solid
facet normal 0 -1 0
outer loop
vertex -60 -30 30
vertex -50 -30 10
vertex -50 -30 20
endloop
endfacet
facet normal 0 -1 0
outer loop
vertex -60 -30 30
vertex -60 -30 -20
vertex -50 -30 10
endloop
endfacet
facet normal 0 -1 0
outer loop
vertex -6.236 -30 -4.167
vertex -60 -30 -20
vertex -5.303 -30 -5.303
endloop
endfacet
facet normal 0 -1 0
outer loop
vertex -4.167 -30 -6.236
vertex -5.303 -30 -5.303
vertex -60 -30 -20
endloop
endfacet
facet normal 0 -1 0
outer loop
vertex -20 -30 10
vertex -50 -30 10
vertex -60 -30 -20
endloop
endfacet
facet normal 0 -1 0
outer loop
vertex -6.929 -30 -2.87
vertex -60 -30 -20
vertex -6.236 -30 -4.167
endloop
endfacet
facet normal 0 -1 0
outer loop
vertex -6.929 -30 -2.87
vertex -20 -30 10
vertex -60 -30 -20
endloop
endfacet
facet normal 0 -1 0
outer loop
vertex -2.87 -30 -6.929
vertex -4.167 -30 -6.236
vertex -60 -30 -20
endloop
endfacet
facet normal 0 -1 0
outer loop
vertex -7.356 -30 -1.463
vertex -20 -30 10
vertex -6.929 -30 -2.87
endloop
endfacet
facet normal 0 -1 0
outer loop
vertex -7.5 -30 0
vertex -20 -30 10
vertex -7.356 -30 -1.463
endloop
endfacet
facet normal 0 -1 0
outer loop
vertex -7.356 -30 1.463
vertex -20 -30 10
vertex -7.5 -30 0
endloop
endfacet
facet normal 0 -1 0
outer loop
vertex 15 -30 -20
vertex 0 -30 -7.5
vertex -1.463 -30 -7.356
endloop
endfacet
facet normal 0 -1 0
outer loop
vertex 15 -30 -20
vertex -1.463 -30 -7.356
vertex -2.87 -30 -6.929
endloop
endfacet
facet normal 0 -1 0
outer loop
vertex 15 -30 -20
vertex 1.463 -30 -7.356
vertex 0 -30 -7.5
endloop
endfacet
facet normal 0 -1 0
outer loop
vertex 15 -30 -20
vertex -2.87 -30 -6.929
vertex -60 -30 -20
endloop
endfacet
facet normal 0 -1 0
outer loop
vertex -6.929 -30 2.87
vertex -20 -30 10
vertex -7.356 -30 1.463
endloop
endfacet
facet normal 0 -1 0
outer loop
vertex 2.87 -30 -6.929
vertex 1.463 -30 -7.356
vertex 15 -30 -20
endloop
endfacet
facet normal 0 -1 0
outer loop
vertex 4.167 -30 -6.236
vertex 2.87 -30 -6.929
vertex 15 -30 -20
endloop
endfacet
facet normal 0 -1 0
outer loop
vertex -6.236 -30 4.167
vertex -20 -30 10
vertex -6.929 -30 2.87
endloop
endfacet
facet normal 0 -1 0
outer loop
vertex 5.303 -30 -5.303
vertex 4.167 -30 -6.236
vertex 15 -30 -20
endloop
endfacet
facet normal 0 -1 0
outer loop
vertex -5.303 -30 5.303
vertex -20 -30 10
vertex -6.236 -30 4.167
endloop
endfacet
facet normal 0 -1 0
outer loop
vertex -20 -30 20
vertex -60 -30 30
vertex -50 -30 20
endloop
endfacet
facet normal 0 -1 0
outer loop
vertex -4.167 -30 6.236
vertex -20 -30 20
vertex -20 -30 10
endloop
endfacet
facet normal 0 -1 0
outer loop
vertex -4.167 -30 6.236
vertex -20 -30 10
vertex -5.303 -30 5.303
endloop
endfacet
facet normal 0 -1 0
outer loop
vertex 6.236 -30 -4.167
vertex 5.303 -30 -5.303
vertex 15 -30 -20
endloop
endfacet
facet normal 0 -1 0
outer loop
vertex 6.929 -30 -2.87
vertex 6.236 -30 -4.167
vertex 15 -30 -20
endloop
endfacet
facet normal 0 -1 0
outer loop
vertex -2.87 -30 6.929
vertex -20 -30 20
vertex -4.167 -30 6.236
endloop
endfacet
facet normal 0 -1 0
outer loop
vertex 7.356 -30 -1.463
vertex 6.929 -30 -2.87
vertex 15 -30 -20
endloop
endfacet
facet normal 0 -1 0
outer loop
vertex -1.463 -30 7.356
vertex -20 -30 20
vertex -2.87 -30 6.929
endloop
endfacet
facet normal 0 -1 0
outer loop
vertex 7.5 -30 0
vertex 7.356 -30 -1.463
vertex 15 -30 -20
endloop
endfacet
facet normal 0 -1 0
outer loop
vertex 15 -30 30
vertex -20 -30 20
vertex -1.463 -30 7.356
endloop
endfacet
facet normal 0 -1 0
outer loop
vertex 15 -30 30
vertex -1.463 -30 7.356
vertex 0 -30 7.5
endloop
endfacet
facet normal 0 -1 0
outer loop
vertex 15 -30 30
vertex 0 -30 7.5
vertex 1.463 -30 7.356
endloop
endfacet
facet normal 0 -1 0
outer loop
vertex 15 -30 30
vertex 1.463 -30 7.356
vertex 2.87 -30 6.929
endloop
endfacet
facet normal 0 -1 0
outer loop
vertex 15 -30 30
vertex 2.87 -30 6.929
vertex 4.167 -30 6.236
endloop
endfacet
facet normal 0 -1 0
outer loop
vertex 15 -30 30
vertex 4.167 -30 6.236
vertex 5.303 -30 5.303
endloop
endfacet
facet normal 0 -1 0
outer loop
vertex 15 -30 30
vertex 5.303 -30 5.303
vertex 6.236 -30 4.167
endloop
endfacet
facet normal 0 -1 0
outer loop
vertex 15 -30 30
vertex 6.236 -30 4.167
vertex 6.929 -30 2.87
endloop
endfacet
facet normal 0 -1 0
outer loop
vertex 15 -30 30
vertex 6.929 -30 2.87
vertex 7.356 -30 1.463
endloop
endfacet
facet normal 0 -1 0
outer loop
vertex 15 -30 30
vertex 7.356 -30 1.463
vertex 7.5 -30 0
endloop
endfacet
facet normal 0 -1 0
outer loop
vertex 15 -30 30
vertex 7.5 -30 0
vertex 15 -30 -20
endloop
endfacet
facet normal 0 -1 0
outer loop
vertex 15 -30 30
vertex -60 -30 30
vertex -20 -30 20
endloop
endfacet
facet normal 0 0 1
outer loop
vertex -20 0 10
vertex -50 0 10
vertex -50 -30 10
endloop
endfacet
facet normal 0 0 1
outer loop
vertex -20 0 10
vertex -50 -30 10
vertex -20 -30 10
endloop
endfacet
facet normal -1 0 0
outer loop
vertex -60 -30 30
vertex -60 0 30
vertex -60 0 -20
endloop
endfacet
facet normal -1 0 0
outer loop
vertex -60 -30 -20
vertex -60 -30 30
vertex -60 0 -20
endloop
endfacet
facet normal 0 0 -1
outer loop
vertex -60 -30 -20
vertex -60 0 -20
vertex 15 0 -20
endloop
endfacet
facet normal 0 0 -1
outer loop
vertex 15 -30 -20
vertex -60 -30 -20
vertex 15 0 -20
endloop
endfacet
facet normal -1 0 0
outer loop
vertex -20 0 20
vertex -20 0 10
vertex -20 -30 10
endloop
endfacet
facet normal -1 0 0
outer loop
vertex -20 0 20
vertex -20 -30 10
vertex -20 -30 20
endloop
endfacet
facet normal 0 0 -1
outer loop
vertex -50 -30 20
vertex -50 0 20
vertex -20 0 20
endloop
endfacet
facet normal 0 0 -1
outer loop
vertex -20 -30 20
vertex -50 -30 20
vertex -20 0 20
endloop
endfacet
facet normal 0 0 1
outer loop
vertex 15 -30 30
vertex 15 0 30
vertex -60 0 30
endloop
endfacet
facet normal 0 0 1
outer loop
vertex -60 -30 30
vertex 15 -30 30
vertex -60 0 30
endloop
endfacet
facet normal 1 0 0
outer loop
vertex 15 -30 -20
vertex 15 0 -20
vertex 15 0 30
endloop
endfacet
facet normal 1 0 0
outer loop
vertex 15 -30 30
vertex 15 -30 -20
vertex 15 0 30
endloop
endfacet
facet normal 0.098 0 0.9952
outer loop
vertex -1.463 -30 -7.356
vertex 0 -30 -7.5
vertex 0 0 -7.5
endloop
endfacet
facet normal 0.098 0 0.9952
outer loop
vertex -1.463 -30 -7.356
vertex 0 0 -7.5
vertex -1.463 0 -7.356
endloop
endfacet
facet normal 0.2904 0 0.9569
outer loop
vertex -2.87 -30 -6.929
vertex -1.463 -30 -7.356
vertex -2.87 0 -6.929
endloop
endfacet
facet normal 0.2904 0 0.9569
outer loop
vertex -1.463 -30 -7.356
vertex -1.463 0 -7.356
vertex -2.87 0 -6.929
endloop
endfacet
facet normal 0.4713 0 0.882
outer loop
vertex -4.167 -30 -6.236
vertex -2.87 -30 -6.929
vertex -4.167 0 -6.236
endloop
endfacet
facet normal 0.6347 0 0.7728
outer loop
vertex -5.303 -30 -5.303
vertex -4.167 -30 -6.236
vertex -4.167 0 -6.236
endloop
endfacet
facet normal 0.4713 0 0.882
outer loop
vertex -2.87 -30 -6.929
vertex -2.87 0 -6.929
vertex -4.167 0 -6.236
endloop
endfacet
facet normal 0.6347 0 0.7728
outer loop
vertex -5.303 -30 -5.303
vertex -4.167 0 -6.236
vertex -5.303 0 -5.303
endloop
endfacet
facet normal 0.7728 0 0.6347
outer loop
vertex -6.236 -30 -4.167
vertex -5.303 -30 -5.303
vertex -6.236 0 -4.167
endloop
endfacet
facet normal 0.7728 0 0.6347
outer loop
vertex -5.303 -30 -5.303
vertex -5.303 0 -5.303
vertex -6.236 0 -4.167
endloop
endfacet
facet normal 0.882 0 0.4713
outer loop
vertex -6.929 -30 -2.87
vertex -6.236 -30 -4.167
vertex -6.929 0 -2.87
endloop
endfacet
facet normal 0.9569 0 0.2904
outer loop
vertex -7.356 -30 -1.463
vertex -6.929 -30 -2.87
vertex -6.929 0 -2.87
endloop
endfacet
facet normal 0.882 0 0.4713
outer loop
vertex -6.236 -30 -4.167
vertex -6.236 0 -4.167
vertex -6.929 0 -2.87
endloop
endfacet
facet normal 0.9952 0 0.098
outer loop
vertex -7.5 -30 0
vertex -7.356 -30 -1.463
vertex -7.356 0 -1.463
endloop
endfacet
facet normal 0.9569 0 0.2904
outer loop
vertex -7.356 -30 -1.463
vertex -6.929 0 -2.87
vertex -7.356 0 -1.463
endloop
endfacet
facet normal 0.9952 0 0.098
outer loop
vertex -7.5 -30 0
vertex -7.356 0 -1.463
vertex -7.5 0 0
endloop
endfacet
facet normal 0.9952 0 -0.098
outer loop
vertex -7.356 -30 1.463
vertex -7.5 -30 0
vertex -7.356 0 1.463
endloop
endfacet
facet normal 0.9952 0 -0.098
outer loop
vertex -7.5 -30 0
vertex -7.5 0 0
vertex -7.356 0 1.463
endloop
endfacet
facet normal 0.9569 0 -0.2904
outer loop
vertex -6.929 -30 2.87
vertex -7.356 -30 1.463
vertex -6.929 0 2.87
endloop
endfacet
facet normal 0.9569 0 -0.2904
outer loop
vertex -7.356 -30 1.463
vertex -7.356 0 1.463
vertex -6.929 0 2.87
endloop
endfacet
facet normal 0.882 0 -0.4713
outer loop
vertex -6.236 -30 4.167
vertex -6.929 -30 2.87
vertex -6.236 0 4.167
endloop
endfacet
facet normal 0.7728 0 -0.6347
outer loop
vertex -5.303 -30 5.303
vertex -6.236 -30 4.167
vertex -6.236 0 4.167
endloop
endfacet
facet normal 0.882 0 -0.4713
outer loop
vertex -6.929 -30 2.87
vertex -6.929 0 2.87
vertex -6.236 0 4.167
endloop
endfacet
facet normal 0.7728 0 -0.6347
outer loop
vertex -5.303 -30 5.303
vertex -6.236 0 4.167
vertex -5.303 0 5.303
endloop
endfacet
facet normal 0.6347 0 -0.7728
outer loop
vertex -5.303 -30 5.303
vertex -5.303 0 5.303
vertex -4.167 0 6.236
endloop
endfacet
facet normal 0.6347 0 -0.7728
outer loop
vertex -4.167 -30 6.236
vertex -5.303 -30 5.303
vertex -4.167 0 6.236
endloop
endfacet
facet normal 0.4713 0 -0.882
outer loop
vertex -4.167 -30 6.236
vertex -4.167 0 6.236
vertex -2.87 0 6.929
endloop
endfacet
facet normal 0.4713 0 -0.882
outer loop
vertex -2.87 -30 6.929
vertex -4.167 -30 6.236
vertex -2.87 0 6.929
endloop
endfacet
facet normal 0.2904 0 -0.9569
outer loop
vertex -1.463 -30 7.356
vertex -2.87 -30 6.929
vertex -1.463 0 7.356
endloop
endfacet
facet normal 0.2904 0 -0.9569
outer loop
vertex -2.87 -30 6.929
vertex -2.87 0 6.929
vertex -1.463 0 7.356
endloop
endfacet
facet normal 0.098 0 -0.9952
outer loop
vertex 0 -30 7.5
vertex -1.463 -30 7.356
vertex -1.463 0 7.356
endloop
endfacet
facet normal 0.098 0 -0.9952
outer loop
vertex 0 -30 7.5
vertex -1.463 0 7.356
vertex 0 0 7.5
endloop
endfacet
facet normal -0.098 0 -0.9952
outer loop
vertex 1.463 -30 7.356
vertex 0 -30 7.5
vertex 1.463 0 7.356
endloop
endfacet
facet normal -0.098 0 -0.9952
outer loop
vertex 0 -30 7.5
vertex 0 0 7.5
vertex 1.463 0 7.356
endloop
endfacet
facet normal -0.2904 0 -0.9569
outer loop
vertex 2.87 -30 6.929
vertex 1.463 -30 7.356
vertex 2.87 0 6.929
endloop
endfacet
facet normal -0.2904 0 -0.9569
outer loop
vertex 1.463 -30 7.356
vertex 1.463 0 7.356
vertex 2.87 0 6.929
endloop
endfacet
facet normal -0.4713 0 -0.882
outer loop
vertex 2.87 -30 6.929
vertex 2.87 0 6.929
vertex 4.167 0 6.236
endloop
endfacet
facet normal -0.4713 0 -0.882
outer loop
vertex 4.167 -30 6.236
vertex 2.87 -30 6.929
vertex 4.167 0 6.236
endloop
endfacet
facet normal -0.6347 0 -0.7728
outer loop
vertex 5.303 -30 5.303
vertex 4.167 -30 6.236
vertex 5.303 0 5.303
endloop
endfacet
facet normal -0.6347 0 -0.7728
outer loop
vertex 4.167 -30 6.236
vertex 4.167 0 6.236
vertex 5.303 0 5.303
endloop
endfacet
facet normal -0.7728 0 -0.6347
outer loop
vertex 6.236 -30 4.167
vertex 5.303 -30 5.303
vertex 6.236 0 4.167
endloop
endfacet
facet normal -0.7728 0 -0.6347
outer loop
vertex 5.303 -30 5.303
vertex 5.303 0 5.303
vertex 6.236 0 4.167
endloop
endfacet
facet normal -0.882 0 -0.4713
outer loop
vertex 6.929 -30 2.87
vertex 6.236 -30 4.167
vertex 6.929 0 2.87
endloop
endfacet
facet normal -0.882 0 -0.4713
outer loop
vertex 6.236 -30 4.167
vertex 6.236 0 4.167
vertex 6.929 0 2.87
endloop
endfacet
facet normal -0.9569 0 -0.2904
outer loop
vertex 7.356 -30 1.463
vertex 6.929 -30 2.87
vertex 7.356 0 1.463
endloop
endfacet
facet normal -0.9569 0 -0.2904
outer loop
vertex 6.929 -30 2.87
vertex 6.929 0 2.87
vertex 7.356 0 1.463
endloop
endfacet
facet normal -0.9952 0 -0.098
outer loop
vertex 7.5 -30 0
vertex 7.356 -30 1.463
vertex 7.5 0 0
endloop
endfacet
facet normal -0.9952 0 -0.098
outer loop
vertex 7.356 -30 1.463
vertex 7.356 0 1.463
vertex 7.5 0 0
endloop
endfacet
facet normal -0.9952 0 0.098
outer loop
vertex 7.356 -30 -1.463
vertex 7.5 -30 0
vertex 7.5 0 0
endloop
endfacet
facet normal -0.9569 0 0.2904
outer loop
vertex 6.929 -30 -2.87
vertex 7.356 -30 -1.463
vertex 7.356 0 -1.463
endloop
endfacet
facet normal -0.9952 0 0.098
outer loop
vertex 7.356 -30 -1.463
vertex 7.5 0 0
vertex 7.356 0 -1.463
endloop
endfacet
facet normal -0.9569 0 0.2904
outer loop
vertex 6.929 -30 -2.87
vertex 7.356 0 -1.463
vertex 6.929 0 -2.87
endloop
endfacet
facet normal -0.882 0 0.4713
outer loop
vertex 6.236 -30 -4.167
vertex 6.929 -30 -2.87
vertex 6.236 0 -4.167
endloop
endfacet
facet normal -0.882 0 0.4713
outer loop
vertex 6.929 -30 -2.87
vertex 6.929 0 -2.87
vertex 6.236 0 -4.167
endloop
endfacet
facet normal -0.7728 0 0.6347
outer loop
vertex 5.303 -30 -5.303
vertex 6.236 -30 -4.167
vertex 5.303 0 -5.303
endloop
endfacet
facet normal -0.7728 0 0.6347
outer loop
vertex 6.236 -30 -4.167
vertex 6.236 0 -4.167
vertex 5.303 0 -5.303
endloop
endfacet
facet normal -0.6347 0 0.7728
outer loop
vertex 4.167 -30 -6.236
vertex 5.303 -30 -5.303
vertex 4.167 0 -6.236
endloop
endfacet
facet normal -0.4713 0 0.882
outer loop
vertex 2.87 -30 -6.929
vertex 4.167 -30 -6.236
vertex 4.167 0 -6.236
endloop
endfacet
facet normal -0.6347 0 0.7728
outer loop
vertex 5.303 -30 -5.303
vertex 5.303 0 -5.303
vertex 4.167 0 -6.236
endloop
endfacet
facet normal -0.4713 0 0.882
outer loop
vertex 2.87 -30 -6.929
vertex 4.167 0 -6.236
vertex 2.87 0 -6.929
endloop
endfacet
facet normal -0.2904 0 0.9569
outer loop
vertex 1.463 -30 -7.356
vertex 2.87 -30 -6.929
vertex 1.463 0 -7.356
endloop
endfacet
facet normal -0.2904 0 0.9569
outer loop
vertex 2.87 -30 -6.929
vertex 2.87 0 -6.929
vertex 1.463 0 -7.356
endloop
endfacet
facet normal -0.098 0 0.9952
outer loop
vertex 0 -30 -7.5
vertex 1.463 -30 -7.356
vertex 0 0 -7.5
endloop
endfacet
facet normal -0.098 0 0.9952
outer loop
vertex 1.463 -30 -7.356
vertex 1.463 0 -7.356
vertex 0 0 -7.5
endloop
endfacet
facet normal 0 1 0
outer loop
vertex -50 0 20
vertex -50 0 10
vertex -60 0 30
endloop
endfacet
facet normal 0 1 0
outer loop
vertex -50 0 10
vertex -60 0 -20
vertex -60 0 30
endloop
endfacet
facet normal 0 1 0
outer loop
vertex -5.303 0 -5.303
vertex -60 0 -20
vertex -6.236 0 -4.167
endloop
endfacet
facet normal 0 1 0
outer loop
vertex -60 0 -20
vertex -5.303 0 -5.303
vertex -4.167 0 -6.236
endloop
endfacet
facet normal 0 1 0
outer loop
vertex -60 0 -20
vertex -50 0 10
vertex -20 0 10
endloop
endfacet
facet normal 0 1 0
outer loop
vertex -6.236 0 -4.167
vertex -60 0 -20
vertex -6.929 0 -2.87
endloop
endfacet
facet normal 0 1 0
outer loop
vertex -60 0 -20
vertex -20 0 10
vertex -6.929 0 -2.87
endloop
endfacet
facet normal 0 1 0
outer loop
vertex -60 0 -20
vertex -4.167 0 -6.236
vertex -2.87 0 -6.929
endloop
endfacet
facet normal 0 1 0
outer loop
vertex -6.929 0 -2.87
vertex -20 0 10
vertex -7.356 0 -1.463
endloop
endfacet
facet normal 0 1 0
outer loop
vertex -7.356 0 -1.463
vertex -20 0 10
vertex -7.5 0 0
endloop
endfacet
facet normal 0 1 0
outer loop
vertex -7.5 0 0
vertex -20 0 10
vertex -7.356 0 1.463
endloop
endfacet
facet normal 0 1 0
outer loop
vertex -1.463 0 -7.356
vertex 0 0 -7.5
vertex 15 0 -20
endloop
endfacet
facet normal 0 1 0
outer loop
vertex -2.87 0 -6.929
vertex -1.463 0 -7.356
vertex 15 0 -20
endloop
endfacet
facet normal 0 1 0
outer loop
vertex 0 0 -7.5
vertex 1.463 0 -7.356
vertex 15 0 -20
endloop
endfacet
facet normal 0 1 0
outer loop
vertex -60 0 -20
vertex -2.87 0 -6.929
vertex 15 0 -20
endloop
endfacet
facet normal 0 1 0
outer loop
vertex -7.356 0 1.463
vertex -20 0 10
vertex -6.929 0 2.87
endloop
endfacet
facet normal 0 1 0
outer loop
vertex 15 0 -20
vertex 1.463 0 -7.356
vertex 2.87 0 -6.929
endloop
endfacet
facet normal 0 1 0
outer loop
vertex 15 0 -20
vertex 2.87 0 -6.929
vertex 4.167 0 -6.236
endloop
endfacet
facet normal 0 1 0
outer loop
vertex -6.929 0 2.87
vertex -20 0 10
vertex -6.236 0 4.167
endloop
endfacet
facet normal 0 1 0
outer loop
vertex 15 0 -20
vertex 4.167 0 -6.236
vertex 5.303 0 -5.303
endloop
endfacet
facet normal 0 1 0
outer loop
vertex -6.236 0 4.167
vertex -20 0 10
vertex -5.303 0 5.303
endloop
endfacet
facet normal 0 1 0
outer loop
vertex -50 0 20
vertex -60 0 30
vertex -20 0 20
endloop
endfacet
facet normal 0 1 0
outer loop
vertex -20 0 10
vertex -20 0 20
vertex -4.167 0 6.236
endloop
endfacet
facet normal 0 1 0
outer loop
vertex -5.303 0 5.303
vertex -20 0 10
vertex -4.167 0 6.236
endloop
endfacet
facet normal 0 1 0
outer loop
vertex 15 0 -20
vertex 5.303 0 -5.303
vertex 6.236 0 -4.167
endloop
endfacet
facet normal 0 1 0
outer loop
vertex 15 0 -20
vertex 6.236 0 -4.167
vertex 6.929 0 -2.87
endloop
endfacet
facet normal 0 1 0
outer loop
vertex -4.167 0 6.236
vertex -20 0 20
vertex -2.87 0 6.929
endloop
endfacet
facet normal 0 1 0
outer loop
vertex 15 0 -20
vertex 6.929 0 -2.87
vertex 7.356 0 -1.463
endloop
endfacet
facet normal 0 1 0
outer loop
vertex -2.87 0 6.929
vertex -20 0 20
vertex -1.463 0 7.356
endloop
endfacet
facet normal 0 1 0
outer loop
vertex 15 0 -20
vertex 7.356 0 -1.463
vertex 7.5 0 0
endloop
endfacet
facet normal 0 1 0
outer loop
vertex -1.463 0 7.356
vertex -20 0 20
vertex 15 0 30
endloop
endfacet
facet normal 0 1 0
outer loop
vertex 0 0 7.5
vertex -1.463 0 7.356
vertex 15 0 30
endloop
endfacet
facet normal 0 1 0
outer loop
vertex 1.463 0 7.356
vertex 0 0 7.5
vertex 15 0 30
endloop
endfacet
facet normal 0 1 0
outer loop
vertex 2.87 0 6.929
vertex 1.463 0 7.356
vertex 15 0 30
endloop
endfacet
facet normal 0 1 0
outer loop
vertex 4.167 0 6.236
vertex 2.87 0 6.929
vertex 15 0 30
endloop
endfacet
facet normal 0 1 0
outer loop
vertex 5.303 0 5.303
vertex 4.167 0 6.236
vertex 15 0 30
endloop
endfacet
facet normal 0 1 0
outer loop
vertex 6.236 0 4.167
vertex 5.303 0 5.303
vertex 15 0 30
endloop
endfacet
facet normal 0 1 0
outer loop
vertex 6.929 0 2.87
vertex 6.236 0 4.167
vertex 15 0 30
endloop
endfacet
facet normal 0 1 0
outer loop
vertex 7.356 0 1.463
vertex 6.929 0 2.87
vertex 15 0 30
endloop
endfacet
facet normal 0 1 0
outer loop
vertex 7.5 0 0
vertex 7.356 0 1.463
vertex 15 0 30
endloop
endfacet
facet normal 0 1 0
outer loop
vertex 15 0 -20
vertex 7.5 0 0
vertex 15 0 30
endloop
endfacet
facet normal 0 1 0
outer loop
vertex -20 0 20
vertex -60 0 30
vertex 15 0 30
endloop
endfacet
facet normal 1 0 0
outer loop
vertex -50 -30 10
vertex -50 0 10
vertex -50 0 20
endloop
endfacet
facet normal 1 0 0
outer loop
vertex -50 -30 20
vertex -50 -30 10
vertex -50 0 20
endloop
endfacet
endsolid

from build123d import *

# Parameters (mm, degrees)
F0_W     = 10
F0_H     = 10
F0_W_2   = 30
F1_DEPTH = 30


with BuildPart() as f1:
    # F0 (on Front) → F1 (new body)
    with BuildSketch(Plane.XZ):
        with Locations((-55, 25)):
            Rectangle(F0_W, F0_H)
        with BuildLine():
            Line((15, 0), (7.5, 0))
            ThreePointArc((7.5, 0), (5.303301, -5.303301), (0, -7.5))
            Line((0, -7.5), (0, -20))
            Line((0, -20), (15, -20))
            Line((15, -20), (15, 0))
        make_face()
        with BuildLine():
            ThreePointArc((0, -7.5), (-5.303301, 5.303301), (7.5, 0))
            Line((7.5, 0), (15, 0))
            Line((15, 0), (15, 30))
            Line((15, 30), (-50, 30))
            Line((-50, 30), (-50, 20))
            Line((-50, 20), (-60, 20))
            Line((-60, 20), (-60, -20))
            Line((-60, -20), (0, -20))
            Line((0, -20), (0, -7.5))
        make_face()
        with Locations((-35, 15)):
            Rectangle(F0_W_2, F0_H, mode=Mode.SUBTRACT)
    extrude(amount=F1_DEPTH)


solid = f1.part
